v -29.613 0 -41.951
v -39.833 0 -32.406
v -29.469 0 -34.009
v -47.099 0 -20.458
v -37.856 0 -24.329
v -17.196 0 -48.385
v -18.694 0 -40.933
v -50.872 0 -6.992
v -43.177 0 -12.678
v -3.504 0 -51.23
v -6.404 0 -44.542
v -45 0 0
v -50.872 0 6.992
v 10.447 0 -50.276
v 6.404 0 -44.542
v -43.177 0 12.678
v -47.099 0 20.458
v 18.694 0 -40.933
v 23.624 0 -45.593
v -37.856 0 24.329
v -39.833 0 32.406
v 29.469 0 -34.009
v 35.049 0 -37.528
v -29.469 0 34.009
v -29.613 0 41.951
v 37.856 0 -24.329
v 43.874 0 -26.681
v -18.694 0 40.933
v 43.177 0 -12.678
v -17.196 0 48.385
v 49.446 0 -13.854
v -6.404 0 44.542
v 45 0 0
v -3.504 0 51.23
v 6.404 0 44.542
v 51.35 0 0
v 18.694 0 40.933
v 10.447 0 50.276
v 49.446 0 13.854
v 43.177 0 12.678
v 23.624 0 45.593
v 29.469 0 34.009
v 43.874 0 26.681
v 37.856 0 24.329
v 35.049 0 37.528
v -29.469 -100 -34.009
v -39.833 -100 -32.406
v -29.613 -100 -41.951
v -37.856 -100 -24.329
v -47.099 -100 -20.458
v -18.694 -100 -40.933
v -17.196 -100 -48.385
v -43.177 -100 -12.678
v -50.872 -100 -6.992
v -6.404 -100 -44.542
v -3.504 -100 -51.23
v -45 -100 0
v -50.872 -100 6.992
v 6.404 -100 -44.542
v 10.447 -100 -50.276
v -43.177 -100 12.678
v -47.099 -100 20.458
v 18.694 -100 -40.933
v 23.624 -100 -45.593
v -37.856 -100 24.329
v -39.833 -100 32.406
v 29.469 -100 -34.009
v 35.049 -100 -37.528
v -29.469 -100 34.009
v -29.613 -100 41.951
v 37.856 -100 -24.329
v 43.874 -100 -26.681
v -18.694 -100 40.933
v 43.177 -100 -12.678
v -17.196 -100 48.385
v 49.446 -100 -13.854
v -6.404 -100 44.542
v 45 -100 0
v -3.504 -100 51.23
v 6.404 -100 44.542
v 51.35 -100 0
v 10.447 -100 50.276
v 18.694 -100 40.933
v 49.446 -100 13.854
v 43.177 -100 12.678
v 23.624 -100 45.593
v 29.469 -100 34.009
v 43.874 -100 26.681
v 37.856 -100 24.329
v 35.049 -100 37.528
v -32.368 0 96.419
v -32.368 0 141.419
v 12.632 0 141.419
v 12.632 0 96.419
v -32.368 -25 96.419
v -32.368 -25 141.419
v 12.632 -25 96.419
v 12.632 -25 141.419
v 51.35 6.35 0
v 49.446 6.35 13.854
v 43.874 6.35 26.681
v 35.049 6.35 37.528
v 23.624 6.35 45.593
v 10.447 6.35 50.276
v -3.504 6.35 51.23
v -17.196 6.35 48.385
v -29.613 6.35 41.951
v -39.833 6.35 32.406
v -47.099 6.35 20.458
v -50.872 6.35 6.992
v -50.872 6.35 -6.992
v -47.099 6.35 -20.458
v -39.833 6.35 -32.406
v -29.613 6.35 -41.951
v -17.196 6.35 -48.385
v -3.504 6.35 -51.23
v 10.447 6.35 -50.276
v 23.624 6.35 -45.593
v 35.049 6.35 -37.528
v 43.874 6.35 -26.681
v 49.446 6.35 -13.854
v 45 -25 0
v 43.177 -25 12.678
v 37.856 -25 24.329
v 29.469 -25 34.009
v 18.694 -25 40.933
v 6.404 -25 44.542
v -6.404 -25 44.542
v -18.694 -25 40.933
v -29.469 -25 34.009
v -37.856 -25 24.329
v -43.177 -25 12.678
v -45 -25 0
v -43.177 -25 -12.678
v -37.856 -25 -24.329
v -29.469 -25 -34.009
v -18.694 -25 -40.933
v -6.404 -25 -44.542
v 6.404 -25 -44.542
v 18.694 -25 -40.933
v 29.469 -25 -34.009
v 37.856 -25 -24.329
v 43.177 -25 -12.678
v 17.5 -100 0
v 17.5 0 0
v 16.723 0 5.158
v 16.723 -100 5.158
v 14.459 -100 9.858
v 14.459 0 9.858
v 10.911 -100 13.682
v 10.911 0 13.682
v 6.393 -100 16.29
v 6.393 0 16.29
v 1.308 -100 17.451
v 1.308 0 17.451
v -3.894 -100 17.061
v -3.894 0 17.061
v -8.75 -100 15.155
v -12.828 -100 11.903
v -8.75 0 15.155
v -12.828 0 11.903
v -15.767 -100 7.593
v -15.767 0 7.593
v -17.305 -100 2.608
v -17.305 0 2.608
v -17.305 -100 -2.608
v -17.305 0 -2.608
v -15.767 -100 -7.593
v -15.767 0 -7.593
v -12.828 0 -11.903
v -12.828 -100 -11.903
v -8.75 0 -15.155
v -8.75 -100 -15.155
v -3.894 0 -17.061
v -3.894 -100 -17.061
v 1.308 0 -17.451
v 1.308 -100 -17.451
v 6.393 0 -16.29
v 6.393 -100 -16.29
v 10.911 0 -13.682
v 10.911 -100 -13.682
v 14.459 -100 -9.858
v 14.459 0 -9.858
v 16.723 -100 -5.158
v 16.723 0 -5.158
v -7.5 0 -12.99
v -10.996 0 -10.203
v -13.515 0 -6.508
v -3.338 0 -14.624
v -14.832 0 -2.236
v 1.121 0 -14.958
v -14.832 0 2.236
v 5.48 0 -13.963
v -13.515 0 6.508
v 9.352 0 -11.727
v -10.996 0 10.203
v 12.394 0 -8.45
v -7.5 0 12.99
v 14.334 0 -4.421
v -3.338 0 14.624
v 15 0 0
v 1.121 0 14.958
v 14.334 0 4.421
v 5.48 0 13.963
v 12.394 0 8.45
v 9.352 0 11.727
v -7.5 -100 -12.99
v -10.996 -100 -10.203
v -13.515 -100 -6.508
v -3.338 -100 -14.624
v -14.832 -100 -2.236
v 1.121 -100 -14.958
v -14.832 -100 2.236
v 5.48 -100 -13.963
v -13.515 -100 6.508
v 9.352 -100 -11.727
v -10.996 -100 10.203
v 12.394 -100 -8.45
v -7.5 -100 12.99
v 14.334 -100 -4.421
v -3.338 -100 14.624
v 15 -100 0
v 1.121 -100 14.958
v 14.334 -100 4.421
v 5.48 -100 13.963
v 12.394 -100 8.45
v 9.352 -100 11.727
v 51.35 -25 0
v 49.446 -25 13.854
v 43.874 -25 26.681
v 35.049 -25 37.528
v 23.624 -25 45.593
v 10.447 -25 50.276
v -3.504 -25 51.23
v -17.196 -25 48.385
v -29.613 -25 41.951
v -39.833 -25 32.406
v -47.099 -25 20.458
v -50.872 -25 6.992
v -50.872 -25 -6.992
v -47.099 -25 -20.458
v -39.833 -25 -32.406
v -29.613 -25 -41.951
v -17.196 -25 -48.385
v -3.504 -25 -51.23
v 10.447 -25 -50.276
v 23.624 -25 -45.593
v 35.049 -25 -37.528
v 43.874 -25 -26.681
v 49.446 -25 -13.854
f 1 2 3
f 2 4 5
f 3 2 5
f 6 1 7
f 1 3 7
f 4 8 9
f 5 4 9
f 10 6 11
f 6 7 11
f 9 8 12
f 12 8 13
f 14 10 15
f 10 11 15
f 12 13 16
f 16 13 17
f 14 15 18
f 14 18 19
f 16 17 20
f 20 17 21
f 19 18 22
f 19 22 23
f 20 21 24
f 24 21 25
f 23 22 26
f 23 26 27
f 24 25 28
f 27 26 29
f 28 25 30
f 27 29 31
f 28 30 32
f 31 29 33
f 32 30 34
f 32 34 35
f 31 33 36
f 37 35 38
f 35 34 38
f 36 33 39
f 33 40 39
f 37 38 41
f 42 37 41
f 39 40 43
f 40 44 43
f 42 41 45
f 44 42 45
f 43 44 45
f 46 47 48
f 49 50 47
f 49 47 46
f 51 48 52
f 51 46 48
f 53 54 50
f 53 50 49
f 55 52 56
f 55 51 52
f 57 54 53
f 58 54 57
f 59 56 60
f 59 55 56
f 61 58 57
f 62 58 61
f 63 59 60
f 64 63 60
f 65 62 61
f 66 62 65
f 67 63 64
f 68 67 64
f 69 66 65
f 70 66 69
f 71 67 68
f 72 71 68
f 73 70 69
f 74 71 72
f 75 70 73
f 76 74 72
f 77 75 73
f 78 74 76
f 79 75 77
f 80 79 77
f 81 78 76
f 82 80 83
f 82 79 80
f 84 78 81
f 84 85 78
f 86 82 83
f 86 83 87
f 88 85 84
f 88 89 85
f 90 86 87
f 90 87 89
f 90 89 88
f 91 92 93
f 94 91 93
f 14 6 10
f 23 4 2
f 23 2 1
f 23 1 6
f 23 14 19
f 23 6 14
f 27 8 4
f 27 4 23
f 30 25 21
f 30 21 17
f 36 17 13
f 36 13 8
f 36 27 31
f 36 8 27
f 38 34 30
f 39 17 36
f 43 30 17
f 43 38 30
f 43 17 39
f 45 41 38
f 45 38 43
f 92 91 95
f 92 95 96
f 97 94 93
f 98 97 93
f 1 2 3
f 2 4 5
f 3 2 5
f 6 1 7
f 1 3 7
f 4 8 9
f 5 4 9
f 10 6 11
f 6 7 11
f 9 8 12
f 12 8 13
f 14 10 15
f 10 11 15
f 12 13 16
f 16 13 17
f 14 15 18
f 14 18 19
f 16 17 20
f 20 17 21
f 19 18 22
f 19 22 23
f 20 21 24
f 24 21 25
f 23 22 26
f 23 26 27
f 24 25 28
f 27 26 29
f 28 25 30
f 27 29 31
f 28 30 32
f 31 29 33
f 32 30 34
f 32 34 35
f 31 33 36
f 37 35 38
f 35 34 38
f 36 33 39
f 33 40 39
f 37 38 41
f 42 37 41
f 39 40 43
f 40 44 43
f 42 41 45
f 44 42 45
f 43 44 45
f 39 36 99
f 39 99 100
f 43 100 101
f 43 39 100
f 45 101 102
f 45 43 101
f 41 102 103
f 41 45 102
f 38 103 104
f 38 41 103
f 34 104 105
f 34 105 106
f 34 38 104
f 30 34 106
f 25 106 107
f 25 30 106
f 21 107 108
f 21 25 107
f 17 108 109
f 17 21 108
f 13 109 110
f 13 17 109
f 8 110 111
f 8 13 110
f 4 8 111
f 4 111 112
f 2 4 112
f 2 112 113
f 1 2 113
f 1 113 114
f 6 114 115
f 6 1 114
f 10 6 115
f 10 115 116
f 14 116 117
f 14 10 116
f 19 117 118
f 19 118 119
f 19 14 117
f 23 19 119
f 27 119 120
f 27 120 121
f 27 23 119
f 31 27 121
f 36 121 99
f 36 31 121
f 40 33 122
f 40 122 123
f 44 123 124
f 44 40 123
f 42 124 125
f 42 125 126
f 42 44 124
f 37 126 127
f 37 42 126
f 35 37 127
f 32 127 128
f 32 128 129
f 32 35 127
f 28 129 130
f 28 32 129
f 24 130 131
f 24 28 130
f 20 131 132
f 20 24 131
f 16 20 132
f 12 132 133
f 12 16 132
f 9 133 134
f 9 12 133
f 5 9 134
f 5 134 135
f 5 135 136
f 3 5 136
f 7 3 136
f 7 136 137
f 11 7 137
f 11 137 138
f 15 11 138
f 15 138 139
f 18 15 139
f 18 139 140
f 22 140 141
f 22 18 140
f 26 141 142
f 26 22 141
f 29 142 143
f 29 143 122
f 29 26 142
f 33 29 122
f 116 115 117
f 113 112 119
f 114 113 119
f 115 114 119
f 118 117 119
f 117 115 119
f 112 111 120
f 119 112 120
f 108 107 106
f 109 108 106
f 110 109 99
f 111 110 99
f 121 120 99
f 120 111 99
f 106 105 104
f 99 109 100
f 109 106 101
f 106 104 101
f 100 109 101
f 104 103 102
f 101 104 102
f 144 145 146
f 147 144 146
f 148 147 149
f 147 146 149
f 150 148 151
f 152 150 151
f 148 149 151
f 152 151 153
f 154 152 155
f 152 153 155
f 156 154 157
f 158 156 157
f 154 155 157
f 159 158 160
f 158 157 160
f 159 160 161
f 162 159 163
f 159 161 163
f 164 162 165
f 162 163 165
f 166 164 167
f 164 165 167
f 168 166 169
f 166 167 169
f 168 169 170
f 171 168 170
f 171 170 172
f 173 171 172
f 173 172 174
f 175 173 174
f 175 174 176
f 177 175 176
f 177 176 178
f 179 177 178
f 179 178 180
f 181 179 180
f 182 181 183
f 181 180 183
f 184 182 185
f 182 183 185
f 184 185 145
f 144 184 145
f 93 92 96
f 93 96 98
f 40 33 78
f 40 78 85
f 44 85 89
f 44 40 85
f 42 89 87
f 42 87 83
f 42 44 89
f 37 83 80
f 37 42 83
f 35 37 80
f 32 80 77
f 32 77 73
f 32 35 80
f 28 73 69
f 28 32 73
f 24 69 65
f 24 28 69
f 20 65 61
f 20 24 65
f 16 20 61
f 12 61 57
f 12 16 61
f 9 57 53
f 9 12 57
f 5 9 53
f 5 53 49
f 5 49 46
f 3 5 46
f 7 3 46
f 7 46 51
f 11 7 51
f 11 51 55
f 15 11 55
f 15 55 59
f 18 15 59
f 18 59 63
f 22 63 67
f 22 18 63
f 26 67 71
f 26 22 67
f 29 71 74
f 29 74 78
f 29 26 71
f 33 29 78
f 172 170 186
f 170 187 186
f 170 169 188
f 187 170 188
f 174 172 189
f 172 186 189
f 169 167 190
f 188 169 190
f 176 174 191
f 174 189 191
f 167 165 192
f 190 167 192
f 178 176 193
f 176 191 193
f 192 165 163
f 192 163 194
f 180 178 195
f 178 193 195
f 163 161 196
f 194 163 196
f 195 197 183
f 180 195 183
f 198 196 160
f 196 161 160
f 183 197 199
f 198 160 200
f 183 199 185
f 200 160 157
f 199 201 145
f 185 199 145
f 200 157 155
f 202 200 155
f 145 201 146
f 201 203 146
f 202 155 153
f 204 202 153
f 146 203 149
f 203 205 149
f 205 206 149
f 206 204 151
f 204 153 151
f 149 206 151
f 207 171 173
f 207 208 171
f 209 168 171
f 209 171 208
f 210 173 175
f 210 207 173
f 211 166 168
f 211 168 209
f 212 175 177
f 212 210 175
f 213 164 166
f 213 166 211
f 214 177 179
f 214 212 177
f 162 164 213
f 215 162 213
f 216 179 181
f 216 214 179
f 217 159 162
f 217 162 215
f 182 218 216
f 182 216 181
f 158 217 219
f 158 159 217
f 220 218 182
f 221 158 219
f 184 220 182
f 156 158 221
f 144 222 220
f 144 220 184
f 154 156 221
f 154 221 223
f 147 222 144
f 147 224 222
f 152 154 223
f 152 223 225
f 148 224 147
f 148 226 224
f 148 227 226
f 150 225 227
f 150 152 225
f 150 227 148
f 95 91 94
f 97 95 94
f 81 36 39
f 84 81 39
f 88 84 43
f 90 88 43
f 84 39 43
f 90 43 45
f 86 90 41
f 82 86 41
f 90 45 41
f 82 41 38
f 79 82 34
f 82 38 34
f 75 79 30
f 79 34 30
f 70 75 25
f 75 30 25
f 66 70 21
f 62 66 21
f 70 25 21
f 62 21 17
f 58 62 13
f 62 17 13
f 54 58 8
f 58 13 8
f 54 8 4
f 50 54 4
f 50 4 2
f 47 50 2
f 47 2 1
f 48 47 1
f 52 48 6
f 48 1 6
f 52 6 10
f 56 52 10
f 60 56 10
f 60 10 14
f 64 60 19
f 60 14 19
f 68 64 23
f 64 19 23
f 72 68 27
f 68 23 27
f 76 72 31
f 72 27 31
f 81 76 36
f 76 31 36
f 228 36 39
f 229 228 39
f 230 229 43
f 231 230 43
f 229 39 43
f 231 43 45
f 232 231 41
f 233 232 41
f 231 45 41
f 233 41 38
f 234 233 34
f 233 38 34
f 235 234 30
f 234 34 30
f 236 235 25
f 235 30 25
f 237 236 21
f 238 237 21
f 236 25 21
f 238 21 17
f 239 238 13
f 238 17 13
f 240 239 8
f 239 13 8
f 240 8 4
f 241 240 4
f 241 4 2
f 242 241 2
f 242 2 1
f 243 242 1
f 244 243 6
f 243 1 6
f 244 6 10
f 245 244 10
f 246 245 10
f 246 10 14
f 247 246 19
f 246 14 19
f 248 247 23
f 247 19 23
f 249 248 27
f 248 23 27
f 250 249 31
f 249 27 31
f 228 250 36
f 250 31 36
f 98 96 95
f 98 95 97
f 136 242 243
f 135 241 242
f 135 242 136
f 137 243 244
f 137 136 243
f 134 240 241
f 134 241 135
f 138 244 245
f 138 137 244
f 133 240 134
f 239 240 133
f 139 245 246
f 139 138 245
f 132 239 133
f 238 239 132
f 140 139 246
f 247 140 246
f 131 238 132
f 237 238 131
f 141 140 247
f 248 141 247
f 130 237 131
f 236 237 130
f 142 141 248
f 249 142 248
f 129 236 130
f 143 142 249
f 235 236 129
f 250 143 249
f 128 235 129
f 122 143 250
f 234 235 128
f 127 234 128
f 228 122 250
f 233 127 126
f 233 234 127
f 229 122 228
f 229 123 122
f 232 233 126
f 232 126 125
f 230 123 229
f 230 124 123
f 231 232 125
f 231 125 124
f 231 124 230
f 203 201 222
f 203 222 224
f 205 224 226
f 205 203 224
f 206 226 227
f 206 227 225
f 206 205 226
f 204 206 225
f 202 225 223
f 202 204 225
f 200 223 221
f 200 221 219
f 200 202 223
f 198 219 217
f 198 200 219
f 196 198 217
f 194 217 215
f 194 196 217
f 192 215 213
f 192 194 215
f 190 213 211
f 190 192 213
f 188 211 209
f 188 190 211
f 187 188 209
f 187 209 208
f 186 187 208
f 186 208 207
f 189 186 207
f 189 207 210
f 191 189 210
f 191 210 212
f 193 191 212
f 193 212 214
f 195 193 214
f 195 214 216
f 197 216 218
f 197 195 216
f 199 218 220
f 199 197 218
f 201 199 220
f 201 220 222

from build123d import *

# Parameters (mm, degrees)
F0_R     = 17.5
F0_R_2   = 15
F1_DEPTH = 100
F0_R_3   = 51.35
F0_R_4   = 45
F2_R     = 51.35
F3_DEPTH = 6.35
F4_DEPTH = 25
F0_W     = 45
F0_H     = 45


with BuildPart() as f1:
    # F0 (on Front) → F1 (new body)
    with BuildSketch(Plane.XZ):
        Circle(F0_R)
        Circle(F0_R_2, mode=Mode.SUBTRACT)
    extrude(amount=F1_DEPTH)


with BuildPart() as f1b:
    # F0 (on Front) → F1, piece 2 (new body)
    with BuildSketch(Plane.XZ):
        Circle(F0_R_3)
        Circle(F0_R_4, mode=Mode.SUBTRACT)
    extrude(amount=F1_DEPTH)


with BuildPart() as f3:
    # F2 (on Front) → F3 (new body)
    with BuildSketch(Plane.XZ):
        Circle(F2_R)
    extrude(amount=-F3_DEPTH)


with BuildPart() as f4:
    # F0 (on Front) → F4 (new body)
    with BuildSketch(Plane.XZ):
        Circle(F0_R_3)
        Circle(F0_R_4, mode=Mode.SUBTRACT)
    extrude(amount=F4_DEPTH)


with BuildPart() as f4b:
    # F0 (on Front) → F4, piece 2 (new body)
    with BuildSketch(Plane.XZ):
        with Locations((-9.8678175732, 118.9188403636)):
            Rectangle(F0_W, F0_H)
    extrude(amount=F4_DEPTH)


solid = Compound([f1.part, f1b.part, f3.part, f4.part, f4b.part])
